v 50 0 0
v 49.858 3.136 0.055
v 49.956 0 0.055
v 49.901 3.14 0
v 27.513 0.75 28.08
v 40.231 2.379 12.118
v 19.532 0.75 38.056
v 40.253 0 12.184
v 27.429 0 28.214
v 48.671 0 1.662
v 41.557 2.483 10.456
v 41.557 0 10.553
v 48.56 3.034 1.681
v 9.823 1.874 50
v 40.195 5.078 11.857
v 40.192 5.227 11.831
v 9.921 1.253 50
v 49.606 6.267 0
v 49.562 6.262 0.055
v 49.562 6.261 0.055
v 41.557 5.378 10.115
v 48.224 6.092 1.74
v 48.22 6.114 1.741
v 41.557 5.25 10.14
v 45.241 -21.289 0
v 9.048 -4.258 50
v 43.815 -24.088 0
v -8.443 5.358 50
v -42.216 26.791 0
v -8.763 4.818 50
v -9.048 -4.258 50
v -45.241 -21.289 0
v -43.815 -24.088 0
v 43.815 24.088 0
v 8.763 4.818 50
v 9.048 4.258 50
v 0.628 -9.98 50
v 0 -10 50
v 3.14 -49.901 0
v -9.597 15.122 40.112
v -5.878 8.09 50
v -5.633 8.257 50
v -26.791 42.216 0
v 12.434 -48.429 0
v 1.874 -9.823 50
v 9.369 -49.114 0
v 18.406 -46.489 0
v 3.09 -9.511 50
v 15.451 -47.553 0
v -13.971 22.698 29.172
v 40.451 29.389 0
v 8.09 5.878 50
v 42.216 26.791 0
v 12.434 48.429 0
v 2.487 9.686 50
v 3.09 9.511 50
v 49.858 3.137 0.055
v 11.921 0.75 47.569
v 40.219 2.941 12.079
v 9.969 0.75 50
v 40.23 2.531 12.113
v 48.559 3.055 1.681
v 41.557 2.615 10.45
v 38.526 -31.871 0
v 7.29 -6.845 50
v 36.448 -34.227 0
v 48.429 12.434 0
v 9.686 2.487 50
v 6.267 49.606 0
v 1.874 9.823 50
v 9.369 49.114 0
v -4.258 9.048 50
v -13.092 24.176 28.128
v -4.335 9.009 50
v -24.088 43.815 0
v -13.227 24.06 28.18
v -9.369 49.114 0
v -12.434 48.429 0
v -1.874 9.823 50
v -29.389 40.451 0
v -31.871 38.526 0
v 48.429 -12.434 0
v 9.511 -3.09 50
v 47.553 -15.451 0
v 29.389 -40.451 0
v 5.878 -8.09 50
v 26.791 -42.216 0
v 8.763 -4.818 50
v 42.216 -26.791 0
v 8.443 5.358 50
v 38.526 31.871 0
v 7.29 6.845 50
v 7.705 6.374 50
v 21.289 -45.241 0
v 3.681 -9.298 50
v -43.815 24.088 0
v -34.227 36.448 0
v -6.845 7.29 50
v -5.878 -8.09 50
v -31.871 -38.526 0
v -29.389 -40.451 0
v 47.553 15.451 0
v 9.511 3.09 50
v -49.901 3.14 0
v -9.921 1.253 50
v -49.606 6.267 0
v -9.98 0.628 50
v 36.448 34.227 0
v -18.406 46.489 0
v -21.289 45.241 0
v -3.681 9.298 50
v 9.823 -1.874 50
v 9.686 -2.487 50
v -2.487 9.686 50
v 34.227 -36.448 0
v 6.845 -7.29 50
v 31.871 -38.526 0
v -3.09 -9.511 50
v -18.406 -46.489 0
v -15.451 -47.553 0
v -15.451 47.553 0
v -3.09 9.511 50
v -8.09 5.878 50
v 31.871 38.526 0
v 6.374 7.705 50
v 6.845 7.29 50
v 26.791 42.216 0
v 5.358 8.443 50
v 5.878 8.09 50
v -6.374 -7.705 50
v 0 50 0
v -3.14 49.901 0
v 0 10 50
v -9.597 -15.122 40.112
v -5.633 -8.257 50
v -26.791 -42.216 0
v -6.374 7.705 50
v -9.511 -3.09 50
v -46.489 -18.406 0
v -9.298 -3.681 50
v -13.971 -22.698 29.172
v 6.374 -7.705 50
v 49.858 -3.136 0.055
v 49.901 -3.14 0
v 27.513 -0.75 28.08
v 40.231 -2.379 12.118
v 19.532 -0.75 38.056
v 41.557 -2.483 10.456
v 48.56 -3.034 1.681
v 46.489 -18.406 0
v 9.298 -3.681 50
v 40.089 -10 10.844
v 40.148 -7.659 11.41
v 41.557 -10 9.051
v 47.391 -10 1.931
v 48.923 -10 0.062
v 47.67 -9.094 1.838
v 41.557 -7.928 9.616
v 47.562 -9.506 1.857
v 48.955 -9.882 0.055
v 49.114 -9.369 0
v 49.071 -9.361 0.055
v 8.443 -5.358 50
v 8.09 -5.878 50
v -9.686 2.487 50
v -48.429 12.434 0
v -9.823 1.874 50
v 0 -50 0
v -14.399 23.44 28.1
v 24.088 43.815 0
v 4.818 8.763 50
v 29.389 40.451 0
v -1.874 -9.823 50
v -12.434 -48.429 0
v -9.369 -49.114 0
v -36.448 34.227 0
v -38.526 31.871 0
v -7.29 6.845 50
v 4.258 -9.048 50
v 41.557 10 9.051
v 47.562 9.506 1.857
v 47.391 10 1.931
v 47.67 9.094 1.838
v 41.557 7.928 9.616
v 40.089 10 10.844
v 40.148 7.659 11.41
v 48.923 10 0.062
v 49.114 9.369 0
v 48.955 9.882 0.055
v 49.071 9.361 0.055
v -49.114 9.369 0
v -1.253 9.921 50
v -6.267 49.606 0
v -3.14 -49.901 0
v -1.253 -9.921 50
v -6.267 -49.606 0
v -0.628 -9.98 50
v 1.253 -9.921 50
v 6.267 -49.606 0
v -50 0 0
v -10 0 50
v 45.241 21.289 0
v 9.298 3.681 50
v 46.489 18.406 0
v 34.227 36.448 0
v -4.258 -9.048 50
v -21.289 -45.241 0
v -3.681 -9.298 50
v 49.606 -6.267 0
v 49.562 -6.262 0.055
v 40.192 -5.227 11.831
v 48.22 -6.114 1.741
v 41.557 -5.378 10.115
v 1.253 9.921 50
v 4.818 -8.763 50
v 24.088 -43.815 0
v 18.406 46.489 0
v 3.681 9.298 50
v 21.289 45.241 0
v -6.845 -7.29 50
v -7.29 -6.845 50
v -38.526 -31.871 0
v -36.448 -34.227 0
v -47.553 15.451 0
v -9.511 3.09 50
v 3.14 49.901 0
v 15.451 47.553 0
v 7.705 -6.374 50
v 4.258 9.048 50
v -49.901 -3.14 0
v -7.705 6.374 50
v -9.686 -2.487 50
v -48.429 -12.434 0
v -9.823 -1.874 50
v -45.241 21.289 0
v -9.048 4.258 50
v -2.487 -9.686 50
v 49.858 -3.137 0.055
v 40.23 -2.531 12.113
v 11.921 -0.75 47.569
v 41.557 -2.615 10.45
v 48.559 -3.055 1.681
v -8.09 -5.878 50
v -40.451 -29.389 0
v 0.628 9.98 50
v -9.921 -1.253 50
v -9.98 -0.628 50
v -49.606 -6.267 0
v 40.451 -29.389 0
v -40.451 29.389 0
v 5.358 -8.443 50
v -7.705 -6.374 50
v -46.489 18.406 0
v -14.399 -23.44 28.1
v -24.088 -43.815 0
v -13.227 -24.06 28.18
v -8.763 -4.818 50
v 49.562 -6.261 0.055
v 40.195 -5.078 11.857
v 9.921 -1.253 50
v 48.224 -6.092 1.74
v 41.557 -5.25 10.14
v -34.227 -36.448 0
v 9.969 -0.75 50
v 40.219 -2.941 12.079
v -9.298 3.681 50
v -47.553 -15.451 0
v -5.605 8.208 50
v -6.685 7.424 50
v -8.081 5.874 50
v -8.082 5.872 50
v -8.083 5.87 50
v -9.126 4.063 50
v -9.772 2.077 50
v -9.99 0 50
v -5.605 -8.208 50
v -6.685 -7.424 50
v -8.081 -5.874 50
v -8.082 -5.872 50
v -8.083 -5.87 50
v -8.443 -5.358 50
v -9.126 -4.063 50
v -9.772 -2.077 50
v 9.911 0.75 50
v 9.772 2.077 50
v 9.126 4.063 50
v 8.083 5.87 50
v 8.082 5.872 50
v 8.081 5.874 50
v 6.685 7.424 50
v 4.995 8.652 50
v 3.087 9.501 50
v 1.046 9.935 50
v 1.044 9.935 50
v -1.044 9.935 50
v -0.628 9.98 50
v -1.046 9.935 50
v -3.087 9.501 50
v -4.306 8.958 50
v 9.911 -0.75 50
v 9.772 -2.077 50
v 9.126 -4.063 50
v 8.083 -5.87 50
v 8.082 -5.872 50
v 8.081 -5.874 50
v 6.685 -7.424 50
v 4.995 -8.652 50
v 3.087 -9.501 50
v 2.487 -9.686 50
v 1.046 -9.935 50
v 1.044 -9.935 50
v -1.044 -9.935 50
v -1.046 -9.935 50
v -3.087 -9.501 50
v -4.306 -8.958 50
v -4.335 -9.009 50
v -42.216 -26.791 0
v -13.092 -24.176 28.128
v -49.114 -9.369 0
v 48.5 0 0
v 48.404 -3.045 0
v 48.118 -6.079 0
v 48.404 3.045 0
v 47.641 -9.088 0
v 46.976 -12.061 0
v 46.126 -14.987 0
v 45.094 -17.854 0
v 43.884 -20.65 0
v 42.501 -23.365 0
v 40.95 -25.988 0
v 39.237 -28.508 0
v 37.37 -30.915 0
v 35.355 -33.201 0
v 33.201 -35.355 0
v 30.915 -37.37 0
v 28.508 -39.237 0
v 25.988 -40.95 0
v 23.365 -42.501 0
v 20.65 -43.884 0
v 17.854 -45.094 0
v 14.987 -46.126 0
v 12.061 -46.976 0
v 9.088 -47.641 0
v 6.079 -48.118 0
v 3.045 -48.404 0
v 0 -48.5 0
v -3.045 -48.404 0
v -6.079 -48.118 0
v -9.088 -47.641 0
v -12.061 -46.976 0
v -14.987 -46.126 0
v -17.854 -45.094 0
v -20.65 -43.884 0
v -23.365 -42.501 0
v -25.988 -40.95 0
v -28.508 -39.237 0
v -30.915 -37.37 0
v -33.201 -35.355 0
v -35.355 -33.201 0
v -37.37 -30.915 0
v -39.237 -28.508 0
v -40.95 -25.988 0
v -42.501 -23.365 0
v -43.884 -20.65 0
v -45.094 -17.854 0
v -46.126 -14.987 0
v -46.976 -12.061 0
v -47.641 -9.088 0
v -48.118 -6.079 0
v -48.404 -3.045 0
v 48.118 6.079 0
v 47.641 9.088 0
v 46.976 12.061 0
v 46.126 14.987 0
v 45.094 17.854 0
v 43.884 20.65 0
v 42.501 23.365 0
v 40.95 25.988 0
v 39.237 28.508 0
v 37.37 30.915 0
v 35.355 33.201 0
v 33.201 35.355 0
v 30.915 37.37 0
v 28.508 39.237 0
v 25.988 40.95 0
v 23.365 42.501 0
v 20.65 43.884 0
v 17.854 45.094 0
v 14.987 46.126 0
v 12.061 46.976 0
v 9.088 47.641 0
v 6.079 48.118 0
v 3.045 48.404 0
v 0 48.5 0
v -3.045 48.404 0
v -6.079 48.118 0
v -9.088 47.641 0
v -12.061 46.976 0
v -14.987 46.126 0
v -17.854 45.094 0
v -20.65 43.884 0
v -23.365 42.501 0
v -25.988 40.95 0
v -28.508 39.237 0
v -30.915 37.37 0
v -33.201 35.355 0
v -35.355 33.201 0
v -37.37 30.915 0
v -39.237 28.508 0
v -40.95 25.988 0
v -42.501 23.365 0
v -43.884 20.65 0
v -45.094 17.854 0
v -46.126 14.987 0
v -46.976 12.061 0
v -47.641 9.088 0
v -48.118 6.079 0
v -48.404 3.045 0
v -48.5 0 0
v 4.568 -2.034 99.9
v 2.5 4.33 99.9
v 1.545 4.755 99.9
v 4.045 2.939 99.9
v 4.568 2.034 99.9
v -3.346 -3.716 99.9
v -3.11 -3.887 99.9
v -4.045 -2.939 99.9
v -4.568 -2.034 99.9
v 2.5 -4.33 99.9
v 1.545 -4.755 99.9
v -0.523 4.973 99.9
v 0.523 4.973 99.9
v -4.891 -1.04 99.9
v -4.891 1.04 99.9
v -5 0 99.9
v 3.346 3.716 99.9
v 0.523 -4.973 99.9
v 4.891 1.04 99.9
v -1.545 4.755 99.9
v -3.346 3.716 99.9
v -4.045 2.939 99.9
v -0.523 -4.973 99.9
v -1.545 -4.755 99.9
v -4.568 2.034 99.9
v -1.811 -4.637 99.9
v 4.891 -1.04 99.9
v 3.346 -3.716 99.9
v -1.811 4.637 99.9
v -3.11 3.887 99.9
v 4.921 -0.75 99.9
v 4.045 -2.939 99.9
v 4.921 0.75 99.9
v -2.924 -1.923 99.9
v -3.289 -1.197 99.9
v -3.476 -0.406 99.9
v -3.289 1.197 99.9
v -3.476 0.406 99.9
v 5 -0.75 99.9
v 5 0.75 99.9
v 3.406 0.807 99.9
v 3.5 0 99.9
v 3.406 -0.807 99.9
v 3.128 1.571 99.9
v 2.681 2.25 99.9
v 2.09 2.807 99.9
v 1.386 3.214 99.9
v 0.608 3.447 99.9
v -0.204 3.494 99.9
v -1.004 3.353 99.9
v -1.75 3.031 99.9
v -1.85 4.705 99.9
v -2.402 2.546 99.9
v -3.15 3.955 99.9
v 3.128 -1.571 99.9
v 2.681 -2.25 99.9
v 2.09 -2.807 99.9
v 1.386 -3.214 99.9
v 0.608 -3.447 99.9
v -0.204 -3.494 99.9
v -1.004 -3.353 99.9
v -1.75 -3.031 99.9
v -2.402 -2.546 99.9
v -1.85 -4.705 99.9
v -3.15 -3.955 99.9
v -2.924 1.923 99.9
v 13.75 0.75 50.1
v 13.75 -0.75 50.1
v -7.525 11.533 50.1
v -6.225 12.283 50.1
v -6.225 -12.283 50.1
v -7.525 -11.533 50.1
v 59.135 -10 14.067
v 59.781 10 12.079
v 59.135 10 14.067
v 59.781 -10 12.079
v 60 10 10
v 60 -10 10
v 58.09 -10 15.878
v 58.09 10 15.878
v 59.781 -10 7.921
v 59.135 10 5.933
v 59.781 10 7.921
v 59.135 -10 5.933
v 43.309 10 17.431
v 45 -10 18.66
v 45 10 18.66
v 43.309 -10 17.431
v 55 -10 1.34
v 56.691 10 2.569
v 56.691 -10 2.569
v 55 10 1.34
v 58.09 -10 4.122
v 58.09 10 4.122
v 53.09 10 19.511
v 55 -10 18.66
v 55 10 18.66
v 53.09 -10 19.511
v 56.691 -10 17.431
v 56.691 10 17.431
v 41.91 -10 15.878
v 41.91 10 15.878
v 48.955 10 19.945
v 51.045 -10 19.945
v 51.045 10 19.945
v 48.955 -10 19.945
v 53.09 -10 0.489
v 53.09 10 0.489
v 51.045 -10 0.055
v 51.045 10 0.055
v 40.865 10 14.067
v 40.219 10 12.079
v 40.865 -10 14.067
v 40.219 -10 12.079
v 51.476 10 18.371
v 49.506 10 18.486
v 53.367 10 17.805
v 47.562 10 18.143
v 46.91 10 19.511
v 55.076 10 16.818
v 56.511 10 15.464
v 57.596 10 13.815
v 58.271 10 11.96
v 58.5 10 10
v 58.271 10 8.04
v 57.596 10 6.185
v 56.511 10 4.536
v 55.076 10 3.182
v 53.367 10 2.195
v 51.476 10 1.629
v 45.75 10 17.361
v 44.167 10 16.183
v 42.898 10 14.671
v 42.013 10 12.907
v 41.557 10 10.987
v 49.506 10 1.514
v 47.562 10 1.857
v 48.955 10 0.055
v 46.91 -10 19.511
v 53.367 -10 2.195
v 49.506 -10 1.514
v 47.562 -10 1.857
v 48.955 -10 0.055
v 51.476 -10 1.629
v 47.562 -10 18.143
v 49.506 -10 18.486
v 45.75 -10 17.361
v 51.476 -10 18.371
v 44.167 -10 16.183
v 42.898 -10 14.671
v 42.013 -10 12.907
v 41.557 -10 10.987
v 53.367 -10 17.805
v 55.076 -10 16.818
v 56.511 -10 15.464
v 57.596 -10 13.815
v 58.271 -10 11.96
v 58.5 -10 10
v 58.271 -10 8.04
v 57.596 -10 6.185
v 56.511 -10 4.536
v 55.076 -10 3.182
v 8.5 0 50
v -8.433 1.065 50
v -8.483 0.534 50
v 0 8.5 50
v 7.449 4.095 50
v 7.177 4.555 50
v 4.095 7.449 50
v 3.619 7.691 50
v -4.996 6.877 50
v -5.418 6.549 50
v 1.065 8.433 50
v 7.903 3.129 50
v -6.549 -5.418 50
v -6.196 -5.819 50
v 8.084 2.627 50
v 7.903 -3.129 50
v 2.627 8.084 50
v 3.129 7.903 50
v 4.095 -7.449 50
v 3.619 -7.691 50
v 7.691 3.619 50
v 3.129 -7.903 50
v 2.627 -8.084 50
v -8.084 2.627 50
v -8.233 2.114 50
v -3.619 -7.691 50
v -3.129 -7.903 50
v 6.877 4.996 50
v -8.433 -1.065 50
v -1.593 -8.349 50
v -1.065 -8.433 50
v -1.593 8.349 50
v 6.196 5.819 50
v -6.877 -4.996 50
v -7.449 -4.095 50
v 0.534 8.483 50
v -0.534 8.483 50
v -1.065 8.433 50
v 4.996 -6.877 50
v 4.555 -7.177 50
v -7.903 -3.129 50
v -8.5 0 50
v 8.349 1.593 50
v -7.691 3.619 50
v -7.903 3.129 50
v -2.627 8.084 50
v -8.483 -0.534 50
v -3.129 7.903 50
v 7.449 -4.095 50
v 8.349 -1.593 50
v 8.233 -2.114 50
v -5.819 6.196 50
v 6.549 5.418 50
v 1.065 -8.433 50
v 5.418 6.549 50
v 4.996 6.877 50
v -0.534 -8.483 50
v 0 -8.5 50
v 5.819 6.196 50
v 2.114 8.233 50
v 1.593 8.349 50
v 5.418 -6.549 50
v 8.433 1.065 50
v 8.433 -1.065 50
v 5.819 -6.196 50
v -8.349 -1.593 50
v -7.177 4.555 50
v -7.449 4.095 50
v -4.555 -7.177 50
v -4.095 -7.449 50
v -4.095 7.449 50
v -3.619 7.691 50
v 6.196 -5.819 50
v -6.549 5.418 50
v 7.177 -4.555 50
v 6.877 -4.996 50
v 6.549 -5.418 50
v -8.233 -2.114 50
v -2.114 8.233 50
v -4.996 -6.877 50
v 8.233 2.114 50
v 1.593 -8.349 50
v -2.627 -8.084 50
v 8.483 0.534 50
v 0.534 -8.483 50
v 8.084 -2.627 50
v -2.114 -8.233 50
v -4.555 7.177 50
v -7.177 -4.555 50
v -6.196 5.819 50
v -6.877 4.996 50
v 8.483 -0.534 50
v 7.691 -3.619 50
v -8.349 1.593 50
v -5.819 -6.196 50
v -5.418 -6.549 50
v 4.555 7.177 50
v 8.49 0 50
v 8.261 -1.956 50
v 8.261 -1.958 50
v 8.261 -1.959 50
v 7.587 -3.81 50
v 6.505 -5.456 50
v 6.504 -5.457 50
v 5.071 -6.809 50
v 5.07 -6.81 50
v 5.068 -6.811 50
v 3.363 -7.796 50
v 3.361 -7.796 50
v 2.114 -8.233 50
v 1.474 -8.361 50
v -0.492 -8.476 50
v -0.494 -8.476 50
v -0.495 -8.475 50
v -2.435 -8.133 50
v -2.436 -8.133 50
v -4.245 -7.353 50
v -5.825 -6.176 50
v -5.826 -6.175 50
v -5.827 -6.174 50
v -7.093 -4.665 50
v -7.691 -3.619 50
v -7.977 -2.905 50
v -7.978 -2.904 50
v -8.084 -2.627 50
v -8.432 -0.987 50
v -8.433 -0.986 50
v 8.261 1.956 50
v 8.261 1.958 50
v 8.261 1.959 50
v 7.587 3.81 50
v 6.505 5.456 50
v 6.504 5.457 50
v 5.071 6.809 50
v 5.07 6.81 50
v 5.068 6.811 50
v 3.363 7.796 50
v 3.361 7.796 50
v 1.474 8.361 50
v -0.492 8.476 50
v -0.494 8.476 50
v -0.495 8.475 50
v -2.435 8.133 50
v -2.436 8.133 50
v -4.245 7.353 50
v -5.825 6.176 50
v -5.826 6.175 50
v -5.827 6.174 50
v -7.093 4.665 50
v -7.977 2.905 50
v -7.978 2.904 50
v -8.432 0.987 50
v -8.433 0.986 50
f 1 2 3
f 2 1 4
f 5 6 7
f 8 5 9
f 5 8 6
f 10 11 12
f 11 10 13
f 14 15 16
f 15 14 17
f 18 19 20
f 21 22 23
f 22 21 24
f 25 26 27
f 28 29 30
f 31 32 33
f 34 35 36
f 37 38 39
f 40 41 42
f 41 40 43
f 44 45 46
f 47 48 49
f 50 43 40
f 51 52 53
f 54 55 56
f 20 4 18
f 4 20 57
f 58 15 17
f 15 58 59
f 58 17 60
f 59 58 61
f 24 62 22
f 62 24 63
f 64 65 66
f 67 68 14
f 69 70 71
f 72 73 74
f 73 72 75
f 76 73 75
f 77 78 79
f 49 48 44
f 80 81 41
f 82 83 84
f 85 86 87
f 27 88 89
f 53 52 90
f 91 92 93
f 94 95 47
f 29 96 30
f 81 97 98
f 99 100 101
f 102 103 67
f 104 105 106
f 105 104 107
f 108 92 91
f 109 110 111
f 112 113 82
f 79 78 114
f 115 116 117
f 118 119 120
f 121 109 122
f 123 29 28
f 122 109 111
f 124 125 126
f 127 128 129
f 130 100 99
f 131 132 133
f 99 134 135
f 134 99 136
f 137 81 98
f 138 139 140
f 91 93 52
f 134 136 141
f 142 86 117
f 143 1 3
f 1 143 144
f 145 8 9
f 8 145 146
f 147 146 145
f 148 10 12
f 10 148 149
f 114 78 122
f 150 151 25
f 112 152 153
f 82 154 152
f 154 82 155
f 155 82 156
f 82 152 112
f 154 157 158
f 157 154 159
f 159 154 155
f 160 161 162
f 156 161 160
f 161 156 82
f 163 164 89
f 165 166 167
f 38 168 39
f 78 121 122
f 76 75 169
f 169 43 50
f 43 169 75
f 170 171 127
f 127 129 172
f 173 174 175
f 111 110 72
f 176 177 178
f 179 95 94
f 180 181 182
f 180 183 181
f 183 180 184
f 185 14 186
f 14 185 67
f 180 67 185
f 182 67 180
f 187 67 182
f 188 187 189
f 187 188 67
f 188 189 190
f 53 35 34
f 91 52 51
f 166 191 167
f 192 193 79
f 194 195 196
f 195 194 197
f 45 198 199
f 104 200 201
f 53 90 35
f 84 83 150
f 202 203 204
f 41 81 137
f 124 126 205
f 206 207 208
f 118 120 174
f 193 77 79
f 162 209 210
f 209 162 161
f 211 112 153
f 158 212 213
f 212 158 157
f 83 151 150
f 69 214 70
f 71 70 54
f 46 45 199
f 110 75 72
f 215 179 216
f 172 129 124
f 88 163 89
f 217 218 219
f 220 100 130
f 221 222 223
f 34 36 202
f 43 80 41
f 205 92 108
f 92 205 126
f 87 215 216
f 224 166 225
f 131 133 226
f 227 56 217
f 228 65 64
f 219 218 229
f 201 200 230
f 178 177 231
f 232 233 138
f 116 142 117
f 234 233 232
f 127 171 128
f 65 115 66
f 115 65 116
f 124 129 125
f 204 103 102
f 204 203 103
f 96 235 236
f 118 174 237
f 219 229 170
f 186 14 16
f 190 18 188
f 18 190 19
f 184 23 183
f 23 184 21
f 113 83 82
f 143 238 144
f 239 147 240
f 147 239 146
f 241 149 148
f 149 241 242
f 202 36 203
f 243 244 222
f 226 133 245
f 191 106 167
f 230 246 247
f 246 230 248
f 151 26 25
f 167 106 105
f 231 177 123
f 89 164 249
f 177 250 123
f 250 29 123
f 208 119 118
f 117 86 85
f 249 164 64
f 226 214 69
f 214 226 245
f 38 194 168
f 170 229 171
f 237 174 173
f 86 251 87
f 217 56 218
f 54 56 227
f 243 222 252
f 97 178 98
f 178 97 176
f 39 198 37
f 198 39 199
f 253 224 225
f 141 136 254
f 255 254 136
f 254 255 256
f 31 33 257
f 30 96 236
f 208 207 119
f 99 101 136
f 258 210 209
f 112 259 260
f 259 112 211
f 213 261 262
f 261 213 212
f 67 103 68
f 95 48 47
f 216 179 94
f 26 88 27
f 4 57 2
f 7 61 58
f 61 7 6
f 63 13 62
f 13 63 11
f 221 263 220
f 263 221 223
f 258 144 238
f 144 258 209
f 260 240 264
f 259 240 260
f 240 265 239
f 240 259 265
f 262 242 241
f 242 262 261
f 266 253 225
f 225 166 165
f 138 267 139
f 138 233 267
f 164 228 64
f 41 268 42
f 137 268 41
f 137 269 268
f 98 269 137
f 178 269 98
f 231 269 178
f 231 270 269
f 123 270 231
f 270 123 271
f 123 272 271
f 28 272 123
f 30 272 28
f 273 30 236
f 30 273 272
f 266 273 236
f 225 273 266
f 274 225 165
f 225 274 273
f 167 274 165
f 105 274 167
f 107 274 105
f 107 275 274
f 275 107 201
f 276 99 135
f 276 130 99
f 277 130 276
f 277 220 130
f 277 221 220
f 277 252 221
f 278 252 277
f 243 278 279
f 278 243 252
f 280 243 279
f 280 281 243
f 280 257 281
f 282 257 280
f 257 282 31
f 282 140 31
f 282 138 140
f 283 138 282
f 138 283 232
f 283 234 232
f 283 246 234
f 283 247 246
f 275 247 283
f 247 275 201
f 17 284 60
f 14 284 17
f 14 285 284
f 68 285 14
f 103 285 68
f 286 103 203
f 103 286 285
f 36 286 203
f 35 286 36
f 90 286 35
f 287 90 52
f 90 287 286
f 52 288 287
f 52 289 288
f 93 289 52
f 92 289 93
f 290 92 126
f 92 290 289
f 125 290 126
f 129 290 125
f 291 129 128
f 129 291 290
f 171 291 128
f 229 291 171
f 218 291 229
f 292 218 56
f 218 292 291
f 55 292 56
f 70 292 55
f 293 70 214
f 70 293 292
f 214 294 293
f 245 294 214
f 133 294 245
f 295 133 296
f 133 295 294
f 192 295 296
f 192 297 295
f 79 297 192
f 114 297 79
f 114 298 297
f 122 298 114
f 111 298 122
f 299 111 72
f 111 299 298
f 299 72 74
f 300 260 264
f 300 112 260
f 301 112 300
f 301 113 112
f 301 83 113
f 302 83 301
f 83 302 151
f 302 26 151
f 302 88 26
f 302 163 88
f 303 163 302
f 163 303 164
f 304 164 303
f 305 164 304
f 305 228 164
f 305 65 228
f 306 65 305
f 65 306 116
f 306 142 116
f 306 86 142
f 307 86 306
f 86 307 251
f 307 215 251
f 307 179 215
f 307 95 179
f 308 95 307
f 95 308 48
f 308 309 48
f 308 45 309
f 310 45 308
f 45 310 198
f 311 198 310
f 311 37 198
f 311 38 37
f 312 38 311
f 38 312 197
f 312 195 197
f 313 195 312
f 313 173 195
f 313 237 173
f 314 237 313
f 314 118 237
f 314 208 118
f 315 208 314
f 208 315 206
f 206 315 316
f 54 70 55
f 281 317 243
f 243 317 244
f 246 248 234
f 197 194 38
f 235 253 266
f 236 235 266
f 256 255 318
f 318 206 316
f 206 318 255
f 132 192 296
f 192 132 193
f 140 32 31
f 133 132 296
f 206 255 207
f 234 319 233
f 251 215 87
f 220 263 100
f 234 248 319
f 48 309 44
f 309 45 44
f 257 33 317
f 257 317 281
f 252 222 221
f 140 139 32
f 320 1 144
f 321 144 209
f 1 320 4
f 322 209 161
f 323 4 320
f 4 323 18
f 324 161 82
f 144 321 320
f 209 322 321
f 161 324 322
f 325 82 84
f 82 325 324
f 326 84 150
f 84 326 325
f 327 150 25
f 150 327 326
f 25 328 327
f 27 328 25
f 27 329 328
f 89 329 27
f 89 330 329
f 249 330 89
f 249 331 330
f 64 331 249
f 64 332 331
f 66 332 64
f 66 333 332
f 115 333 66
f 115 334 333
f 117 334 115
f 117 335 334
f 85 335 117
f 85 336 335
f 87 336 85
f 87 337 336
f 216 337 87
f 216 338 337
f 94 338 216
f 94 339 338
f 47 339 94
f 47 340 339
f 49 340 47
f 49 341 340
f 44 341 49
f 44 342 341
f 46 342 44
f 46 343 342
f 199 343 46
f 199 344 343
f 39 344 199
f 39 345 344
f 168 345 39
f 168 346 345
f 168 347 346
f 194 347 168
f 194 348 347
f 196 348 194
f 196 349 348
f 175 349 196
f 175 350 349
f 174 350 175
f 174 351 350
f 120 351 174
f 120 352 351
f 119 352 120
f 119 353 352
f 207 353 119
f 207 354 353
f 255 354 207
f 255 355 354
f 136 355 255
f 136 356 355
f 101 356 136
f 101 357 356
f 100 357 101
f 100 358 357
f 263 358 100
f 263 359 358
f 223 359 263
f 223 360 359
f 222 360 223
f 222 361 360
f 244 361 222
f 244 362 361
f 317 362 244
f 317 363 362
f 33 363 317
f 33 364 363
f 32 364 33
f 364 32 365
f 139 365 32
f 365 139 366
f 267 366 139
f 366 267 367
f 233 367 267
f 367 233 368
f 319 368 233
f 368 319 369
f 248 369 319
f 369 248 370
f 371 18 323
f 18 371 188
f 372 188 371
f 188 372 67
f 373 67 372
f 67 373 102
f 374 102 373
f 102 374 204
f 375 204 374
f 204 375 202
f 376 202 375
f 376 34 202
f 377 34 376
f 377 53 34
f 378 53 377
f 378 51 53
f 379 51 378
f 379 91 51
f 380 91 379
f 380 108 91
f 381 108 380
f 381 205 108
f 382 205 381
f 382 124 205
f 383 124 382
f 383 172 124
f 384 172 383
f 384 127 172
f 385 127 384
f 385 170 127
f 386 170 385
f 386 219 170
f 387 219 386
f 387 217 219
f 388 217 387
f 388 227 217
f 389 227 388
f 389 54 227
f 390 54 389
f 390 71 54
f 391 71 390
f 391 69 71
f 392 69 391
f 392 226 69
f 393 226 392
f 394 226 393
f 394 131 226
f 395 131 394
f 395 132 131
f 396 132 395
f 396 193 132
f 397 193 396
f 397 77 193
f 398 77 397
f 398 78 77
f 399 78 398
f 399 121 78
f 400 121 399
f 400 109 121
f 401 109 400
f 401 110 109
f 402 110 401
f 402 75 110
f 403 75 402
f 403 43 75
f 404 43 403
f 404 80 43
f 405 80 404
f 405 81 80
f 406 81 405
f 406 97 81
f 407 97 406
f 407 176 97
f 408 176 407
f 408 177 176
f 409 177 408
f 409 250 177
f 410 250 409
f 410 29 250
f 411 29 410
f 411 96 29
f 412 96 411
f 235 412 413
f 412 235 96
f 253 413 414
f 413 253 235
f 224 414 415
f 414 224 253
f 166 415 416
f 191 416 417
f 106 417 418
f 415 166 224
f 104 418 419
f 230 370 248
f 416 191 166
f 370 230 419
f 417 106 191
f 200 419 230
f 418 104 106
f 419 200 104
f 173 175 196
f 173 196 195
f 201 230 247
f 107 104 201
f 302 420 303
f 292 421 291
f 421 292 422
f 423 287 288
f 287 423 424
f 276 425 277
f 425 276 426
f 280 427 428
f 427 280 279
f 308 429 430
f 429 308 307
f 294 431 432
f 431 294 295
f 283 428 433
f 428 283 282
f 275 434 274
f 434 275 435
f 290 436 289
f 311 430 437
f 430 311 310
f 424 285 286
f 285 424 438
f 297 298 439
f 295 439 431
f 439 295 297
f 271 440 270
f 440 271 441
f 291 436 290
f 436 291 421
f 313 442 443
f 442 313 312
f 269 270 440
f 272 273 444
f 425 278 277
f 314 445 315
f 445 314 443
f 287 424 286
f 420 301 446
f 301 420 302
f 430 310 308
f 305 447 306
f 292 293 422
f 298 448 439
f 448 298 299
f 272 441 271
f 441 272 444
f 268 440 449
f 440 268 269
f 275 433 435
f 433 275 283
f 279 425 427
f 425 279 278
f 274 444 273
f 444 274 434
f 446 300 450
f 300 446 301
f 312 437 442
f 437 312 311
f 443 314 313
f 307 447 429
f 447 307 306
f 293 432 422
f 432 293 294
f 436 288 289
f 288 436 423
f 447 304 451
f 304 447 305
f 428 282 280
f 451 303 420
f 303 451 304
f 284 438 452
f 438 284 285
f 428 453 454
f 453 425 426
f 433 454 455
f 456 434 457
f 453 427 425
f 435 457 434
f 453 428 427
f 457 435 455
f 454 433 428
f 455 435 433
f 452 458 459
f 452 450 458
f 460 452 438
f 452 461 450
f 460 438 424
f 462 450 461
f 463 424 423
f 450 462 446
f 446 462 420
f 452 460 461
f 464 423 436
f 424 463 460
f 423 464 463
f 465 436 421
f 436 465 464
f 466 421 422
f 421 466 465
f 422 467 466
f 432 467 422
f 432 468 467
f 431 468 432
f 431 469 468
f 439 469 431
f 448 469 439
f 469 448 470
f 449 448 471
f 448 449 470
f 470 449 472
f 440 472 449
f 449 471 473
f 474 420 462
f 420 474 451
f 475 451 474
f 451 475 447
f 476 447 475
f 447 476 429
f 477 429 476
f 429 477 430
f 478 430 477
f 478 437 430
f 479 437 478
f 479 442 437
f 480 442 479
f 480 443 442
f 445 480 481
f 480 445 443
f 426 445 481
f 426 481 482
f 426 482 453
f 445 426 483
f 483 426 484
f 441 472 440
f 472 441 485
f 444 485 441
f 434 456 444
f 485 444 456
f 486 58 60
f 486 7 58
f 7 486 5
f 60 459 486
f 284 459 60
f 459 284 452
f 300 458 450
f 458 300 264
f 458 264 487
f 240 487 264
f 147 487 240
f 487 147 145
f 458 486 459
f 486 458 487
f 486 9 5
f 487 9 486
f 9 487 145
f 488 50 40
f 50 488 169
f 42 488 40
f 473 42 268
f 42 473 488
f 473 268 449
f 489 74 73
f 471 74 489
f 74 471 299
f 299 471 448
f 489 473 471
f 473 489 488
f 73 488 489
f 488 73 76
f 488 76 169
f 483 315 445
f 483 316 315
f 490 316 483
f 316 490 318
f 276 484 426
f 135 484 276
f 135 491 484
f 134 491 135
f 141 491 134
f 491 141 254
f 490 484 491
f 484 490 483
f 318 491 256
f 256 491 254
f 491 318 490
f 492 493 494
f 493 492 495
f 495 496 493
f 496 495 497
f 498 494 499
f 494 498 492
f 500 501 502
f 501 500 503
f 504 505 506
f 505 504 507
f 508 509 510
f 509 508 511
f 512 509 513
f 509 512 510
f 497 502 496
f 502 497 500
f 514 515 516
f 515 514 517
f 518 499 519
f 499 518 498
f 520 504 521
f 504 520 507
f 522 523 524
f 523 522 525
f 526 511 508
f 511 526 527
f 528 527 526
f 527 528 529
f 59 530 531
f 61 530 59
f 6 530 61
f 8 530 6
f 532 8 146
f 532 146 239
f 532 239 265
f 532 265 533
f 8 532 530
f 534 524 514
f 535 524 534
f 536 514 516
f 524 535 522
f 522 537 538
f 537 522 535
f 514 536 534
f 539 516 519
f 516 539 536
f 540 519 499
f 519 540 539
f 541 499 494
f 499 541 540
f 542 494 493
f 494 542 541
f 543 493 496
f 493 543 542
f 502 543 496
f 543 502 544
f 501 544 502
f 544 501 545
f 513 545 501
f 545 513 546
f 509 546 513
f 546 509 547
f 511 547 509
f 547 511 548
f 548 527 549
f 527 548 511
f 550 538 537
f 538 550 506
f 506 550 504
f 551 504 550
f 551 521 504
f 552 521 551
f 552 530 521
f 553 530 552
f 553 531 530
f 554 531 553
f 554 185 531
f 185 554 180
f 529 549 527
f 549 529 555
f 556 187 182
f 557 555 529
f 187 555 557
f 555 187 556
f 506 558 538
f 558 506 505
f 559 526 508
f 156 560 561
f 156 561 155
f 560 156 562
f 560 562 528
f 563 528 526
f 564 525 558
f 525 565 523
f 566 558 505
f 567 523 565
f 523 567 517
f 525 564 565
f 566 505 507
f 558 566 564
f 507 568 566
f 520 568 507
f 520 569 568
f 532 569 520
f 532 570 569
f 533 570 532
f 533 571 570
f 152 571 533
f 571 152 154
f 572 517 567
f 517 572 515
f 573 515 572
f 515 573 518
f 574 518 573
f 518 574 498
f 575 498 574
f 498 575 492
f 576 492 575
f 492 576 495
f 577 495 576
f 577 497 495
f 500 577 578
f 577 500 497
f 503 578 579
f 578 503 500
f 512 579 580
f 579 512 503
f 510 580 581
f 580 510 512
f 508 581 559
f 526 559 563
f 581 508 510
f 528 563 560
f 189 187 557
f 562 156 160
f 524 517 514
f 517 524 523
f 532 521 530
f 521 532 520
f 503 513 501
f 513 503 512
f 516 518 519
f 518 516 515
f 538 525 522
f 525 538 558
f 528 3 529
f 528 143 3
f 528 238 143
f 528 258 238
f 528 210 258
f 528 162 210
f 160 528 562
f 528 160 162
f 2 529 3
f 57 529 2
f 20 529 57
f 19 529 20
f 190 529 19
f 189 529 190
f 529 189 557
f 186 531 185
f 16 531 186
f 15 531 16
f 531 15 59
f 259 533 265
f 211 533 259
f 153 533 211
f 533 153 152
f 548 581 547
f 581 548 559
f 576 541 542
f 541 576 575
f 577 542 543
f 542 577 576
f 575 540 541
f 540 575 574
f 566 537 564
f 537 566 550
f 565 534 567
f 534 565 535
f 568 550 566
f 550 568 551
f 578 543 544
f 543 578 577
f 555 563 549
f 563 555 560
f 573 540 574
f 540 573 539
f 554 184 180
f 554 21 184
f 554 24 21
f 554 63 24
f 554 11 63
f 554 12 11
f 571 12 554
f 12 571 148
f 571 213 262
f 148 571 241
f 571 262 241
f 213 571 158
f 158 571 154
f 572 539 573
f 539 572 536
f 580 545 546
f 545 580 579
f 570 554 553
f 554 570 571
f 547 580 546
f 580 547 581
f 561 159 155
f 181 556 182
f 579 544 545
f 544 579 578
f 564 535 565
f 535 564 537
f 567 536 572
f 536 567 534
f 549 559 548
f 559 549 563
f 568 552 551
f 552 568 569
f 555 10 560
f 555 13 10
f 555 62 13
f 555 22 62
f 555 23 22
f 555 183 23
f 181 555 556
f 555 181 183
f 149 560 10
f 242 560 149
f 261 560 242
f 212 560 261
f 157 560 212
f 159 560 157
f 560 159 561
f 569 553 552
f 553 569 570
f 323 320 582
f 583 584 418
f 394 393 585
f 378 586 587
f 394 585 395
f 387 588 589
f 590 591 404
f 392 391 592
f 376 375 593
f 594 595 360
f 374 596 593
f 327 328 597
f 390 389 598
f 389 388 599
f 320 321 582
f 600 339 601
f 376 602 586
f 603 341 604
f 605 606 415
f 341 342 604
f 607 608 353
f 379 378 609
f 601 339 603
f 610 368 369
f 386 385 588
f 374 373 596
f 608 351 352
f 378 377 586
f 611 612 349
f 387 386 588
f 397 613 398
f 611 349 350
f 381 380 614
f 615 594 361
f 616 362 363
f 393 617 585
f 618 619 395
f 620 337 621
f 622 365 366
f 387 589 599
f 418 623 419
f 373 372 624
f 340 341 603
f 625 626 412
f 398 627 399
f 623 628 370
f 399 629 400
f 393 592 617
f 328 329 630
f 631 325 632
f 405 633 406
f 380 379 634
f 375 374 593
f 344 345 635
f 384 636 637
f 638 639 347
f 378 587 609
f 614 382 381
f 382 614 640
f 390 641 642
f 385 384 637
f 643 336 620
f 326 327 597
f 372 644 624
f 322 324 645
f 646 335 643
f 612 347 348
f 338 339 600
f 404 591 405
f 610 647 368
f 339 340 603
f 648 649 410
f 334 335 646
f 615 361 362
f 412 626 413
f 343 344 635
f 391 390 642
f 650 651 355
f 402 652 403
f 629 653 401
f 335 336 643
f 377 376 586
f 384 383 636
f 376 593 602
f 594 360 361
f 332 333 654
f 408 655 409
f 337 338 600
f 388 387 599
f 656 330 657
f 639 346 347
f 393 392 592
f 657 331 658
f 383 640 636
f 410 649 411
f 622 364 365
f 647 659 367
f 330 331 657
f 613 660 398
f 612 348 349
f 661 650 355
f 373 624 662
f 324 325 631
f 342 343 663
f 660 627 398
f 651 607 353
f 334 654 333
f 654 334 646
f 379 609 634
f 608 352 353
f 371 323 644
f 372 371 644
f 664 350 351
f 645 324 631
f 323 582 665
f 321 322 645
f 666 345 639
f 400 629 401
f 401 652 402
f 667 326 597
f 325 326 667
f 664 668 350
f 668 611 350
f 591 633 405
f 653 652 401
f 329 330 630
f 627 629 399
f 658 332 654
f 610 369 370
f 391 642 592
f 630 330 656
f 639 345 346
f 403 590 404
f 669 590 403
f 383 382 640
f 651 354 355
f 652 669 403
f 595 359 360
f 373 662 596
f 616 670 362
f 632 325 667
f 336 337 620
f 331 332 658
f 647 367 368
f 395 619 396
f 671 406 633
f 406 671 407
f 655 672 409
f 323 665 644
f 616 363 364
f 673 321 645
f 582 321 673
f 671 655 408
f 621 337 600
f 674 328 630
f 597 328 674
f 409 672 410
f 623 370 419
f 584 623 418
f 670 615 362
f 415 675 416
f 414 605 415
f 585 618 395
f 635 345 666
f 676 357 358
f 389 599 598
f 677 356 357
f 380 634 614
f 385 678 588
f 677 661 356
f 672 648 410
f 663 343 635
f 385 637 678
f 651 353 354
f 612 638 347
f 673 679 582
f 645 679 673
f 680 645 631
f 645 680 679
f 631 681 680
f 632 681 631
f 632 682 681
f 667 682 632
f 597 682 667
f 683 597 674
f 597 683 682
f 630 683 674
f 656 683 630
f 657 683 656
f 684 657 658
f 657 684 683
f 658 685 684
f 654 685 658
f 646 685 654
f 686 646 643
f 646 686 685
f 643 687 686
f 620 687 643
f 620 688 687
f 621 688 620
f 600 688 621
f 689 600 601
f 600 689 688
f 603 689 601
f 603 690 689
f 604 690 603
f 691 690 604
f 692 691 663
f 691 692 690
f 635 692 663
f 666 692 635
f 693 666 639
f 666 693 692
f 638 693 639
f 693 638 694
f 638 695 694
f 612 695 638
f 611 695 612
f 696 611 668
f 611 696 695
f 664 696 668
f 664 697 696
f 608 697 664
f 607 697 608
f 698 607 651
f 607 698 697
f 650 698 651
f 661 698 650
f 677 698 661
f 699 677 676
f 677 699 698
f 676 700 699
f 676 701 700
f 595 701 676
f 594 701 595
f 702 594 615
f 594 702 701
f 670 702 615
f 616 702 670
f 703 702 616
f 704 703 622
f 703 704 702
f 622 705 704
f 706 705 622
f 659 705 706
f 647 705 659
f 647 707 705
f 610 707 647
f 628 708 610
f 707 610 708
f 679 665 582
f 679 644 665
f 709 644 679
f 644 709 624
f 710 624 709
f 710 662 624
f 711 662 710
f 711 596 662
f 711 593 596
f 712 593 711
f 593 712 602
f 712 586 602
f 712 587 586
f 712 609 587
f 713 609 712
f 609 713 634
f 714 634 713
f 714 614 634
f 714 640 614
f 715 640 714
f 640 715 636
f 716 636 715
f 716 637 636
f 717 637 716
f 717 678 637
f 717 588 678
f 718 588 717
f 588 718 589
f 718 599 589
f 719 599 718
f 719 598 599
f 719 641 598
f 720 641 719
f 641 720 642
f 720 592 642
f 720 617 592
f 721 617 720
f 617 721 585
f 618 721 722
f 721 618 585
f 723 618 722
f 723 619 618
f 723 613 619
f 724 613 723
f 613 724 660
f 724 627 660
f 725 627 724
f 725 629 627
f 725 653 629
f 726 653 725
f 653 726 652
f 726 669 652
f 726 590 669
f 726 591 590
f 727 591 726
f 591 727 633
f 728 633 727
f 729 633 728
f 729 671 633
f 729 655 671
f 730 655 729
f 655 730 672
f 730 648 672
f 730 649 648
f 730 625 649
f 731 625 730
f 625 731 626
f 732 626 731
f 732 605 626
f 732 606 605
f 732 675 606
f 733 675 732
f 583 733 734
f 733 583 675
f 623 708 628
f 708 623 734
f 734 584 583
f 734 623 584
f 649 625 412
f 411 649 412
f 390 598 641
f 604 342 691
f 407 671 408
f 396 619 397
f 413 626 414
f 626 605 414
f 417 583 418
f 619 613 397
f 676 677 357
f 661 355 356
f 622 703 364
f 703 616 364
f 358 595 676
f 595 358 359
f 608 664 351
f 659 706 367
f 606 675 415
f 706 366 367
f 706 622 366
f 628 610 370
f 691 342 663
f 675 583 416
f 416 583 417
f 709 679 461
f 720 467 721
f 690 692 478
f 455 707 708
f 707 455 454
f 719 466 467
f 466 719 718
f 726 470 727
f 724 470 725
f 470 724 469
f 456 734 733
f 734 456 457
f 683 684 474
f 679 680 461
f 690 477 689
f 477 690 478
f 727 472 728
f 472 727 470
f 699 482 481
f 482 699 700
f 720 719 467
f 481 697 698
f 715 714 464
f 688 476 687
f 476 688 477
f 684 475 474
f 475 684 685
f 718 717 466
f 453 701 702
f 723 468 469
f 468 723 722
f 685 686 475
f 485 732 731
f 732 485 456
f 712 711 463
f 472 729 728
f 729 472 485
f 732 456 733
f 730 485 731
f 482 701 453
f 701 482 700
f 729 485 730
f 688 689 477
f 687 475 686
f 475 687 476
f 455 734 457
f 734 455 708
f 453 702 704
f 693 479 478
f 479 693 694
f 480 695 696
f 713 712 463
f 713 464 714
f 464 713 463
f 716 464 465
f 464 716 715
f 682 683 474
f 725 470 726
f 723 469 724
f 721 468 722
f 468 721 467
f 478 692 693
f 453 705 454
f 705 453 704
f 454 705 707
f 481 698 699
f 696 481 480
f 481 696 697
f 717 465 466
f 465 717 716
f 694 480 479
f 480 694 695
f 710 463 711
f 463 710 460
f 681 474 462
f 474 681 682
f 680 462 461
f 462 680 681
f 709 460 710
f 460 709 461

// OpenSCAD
top_diameter    = 100; // [40:1:500]
middle_diameter =  20; // [10:1:60]
bottom_diameter =  10; // [5:1:40]
//top_cone_height = top_diameter / 2;

wall = 1.5; // [0.5:0.05:4]
create_ventilation = "true"; // [true, false]
create_handle = "true"; // [true, false]

all();

module all()
{
    difference()
    {
        union()
        {
            funnel();
            if(create_ventilation == "true") ventilation();
            if(create_handle == "true") handle();
        }
        funnel(wall);
        
    }
}

module funnel(wall=0)
{
    cylinder(d1=top_diameter-2*wall, d2=middle_diameter-2*wall, top_diameter/2, $fn=top_diameter);
    translate([0,0,top_diameter/2-0.1]) 
        cylinder(d1=middle_diameter-2*wall, d2=bottom_diameter-2*wall, top_diameter/2);
}

module handle()
{
    translate([top_diameter/2,middle_diameter/2,middle_diameter/2]) rotate([90,0,0]) 
        difference()
        {
            cylinder(d=middle_diameter, h=middle_diameter);
            cylinder(d=middle_diameter-2*wall, h=middle_diameter);
        }
}

module ventilation()
{
    for(alpha=[0,120,240])
    {
        rotate([0,0,alpha])
        union()
        {
            hull()
            {
                // bottom of funnel
                translate([0,-wall/2,top_diameter-0.2]) 
                    cube([bottom_diameter/2,wall,0.1]);
                // middle of funnel
                translate([0,-wall/2,top_diameter/2]) 
                    cube([middle_diameter/2+2.5*wall,wall,0.1]);
            }
            hull()
            {
                // middle of funnel
                translate([0,-wall/2,top_diameter/2]) 
                    cube([middle_diameter/2+2.5*wall,wall,0.1]);
                // top of funnel
                translate([0,-wall/2,0]) 
                    cube([top_diameter/2*0.9,wall,0.1]);
            }
        }
    }
}
